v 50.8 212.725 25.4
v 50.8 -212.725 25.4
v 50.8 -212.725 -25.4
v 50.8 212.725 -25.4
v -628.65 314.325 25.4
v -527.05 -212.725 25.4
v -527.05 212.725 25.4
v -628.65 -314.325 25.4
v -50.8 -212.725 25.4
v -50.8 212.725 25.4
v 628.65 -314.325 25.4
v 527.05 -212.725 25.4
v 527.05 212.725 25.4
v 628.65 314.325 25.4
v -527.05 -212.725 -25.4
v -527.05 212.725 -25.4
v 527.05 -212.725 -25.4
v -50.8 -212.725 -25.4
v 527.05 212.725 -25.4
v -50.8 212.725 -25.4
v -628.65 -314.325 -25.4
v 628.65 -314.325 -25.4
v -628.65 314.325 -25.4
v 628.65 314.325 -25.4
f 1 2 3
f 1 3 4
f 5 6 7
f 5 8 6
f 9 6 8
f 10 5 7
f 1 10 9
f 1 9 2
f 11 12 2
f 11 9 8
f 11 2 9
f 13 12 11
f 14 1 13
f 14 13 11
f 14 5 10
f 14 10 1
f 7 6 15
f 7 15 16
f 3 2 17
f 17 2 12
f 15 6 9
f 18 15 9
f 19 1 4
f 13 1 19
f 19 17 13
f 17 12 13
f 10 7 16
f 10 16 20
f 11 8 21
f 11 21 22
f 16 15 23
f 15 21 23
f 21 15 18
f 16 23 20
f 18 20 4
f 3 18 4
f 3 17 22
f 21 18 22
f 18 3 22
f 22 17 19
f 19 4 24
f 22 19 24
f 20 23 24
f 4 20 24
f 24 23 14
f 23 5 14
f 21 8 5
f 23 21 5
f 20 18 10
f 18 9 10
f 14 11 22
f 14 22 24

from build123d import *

# Parameters (mm, degrees)
F0_W     = 1257.3
F0_H     = 628.65
F0_W_2   = 476.25
F0_H_2   = 425.45
F1_DEPTH = 25.4


with BuildPart() as f1:
    # F0 (on Top) → F1 (new body, symmetric)
    with BuildSketch(Plane.XY):
        Rectangle(F0_W, F0_H)
        with Locations((-288.925, 0)):
            Rectangle(F0_W_2, F0_H_2, mode=Mode.SUBTRACT)
        with Locations((288.925, 0)):
            Rectangle(F0_W_2, F0_H_2, mode=Mode.SUBTRACT)
    extrude(amount=F1_DEPTH, both=True)


solid = f1.part
